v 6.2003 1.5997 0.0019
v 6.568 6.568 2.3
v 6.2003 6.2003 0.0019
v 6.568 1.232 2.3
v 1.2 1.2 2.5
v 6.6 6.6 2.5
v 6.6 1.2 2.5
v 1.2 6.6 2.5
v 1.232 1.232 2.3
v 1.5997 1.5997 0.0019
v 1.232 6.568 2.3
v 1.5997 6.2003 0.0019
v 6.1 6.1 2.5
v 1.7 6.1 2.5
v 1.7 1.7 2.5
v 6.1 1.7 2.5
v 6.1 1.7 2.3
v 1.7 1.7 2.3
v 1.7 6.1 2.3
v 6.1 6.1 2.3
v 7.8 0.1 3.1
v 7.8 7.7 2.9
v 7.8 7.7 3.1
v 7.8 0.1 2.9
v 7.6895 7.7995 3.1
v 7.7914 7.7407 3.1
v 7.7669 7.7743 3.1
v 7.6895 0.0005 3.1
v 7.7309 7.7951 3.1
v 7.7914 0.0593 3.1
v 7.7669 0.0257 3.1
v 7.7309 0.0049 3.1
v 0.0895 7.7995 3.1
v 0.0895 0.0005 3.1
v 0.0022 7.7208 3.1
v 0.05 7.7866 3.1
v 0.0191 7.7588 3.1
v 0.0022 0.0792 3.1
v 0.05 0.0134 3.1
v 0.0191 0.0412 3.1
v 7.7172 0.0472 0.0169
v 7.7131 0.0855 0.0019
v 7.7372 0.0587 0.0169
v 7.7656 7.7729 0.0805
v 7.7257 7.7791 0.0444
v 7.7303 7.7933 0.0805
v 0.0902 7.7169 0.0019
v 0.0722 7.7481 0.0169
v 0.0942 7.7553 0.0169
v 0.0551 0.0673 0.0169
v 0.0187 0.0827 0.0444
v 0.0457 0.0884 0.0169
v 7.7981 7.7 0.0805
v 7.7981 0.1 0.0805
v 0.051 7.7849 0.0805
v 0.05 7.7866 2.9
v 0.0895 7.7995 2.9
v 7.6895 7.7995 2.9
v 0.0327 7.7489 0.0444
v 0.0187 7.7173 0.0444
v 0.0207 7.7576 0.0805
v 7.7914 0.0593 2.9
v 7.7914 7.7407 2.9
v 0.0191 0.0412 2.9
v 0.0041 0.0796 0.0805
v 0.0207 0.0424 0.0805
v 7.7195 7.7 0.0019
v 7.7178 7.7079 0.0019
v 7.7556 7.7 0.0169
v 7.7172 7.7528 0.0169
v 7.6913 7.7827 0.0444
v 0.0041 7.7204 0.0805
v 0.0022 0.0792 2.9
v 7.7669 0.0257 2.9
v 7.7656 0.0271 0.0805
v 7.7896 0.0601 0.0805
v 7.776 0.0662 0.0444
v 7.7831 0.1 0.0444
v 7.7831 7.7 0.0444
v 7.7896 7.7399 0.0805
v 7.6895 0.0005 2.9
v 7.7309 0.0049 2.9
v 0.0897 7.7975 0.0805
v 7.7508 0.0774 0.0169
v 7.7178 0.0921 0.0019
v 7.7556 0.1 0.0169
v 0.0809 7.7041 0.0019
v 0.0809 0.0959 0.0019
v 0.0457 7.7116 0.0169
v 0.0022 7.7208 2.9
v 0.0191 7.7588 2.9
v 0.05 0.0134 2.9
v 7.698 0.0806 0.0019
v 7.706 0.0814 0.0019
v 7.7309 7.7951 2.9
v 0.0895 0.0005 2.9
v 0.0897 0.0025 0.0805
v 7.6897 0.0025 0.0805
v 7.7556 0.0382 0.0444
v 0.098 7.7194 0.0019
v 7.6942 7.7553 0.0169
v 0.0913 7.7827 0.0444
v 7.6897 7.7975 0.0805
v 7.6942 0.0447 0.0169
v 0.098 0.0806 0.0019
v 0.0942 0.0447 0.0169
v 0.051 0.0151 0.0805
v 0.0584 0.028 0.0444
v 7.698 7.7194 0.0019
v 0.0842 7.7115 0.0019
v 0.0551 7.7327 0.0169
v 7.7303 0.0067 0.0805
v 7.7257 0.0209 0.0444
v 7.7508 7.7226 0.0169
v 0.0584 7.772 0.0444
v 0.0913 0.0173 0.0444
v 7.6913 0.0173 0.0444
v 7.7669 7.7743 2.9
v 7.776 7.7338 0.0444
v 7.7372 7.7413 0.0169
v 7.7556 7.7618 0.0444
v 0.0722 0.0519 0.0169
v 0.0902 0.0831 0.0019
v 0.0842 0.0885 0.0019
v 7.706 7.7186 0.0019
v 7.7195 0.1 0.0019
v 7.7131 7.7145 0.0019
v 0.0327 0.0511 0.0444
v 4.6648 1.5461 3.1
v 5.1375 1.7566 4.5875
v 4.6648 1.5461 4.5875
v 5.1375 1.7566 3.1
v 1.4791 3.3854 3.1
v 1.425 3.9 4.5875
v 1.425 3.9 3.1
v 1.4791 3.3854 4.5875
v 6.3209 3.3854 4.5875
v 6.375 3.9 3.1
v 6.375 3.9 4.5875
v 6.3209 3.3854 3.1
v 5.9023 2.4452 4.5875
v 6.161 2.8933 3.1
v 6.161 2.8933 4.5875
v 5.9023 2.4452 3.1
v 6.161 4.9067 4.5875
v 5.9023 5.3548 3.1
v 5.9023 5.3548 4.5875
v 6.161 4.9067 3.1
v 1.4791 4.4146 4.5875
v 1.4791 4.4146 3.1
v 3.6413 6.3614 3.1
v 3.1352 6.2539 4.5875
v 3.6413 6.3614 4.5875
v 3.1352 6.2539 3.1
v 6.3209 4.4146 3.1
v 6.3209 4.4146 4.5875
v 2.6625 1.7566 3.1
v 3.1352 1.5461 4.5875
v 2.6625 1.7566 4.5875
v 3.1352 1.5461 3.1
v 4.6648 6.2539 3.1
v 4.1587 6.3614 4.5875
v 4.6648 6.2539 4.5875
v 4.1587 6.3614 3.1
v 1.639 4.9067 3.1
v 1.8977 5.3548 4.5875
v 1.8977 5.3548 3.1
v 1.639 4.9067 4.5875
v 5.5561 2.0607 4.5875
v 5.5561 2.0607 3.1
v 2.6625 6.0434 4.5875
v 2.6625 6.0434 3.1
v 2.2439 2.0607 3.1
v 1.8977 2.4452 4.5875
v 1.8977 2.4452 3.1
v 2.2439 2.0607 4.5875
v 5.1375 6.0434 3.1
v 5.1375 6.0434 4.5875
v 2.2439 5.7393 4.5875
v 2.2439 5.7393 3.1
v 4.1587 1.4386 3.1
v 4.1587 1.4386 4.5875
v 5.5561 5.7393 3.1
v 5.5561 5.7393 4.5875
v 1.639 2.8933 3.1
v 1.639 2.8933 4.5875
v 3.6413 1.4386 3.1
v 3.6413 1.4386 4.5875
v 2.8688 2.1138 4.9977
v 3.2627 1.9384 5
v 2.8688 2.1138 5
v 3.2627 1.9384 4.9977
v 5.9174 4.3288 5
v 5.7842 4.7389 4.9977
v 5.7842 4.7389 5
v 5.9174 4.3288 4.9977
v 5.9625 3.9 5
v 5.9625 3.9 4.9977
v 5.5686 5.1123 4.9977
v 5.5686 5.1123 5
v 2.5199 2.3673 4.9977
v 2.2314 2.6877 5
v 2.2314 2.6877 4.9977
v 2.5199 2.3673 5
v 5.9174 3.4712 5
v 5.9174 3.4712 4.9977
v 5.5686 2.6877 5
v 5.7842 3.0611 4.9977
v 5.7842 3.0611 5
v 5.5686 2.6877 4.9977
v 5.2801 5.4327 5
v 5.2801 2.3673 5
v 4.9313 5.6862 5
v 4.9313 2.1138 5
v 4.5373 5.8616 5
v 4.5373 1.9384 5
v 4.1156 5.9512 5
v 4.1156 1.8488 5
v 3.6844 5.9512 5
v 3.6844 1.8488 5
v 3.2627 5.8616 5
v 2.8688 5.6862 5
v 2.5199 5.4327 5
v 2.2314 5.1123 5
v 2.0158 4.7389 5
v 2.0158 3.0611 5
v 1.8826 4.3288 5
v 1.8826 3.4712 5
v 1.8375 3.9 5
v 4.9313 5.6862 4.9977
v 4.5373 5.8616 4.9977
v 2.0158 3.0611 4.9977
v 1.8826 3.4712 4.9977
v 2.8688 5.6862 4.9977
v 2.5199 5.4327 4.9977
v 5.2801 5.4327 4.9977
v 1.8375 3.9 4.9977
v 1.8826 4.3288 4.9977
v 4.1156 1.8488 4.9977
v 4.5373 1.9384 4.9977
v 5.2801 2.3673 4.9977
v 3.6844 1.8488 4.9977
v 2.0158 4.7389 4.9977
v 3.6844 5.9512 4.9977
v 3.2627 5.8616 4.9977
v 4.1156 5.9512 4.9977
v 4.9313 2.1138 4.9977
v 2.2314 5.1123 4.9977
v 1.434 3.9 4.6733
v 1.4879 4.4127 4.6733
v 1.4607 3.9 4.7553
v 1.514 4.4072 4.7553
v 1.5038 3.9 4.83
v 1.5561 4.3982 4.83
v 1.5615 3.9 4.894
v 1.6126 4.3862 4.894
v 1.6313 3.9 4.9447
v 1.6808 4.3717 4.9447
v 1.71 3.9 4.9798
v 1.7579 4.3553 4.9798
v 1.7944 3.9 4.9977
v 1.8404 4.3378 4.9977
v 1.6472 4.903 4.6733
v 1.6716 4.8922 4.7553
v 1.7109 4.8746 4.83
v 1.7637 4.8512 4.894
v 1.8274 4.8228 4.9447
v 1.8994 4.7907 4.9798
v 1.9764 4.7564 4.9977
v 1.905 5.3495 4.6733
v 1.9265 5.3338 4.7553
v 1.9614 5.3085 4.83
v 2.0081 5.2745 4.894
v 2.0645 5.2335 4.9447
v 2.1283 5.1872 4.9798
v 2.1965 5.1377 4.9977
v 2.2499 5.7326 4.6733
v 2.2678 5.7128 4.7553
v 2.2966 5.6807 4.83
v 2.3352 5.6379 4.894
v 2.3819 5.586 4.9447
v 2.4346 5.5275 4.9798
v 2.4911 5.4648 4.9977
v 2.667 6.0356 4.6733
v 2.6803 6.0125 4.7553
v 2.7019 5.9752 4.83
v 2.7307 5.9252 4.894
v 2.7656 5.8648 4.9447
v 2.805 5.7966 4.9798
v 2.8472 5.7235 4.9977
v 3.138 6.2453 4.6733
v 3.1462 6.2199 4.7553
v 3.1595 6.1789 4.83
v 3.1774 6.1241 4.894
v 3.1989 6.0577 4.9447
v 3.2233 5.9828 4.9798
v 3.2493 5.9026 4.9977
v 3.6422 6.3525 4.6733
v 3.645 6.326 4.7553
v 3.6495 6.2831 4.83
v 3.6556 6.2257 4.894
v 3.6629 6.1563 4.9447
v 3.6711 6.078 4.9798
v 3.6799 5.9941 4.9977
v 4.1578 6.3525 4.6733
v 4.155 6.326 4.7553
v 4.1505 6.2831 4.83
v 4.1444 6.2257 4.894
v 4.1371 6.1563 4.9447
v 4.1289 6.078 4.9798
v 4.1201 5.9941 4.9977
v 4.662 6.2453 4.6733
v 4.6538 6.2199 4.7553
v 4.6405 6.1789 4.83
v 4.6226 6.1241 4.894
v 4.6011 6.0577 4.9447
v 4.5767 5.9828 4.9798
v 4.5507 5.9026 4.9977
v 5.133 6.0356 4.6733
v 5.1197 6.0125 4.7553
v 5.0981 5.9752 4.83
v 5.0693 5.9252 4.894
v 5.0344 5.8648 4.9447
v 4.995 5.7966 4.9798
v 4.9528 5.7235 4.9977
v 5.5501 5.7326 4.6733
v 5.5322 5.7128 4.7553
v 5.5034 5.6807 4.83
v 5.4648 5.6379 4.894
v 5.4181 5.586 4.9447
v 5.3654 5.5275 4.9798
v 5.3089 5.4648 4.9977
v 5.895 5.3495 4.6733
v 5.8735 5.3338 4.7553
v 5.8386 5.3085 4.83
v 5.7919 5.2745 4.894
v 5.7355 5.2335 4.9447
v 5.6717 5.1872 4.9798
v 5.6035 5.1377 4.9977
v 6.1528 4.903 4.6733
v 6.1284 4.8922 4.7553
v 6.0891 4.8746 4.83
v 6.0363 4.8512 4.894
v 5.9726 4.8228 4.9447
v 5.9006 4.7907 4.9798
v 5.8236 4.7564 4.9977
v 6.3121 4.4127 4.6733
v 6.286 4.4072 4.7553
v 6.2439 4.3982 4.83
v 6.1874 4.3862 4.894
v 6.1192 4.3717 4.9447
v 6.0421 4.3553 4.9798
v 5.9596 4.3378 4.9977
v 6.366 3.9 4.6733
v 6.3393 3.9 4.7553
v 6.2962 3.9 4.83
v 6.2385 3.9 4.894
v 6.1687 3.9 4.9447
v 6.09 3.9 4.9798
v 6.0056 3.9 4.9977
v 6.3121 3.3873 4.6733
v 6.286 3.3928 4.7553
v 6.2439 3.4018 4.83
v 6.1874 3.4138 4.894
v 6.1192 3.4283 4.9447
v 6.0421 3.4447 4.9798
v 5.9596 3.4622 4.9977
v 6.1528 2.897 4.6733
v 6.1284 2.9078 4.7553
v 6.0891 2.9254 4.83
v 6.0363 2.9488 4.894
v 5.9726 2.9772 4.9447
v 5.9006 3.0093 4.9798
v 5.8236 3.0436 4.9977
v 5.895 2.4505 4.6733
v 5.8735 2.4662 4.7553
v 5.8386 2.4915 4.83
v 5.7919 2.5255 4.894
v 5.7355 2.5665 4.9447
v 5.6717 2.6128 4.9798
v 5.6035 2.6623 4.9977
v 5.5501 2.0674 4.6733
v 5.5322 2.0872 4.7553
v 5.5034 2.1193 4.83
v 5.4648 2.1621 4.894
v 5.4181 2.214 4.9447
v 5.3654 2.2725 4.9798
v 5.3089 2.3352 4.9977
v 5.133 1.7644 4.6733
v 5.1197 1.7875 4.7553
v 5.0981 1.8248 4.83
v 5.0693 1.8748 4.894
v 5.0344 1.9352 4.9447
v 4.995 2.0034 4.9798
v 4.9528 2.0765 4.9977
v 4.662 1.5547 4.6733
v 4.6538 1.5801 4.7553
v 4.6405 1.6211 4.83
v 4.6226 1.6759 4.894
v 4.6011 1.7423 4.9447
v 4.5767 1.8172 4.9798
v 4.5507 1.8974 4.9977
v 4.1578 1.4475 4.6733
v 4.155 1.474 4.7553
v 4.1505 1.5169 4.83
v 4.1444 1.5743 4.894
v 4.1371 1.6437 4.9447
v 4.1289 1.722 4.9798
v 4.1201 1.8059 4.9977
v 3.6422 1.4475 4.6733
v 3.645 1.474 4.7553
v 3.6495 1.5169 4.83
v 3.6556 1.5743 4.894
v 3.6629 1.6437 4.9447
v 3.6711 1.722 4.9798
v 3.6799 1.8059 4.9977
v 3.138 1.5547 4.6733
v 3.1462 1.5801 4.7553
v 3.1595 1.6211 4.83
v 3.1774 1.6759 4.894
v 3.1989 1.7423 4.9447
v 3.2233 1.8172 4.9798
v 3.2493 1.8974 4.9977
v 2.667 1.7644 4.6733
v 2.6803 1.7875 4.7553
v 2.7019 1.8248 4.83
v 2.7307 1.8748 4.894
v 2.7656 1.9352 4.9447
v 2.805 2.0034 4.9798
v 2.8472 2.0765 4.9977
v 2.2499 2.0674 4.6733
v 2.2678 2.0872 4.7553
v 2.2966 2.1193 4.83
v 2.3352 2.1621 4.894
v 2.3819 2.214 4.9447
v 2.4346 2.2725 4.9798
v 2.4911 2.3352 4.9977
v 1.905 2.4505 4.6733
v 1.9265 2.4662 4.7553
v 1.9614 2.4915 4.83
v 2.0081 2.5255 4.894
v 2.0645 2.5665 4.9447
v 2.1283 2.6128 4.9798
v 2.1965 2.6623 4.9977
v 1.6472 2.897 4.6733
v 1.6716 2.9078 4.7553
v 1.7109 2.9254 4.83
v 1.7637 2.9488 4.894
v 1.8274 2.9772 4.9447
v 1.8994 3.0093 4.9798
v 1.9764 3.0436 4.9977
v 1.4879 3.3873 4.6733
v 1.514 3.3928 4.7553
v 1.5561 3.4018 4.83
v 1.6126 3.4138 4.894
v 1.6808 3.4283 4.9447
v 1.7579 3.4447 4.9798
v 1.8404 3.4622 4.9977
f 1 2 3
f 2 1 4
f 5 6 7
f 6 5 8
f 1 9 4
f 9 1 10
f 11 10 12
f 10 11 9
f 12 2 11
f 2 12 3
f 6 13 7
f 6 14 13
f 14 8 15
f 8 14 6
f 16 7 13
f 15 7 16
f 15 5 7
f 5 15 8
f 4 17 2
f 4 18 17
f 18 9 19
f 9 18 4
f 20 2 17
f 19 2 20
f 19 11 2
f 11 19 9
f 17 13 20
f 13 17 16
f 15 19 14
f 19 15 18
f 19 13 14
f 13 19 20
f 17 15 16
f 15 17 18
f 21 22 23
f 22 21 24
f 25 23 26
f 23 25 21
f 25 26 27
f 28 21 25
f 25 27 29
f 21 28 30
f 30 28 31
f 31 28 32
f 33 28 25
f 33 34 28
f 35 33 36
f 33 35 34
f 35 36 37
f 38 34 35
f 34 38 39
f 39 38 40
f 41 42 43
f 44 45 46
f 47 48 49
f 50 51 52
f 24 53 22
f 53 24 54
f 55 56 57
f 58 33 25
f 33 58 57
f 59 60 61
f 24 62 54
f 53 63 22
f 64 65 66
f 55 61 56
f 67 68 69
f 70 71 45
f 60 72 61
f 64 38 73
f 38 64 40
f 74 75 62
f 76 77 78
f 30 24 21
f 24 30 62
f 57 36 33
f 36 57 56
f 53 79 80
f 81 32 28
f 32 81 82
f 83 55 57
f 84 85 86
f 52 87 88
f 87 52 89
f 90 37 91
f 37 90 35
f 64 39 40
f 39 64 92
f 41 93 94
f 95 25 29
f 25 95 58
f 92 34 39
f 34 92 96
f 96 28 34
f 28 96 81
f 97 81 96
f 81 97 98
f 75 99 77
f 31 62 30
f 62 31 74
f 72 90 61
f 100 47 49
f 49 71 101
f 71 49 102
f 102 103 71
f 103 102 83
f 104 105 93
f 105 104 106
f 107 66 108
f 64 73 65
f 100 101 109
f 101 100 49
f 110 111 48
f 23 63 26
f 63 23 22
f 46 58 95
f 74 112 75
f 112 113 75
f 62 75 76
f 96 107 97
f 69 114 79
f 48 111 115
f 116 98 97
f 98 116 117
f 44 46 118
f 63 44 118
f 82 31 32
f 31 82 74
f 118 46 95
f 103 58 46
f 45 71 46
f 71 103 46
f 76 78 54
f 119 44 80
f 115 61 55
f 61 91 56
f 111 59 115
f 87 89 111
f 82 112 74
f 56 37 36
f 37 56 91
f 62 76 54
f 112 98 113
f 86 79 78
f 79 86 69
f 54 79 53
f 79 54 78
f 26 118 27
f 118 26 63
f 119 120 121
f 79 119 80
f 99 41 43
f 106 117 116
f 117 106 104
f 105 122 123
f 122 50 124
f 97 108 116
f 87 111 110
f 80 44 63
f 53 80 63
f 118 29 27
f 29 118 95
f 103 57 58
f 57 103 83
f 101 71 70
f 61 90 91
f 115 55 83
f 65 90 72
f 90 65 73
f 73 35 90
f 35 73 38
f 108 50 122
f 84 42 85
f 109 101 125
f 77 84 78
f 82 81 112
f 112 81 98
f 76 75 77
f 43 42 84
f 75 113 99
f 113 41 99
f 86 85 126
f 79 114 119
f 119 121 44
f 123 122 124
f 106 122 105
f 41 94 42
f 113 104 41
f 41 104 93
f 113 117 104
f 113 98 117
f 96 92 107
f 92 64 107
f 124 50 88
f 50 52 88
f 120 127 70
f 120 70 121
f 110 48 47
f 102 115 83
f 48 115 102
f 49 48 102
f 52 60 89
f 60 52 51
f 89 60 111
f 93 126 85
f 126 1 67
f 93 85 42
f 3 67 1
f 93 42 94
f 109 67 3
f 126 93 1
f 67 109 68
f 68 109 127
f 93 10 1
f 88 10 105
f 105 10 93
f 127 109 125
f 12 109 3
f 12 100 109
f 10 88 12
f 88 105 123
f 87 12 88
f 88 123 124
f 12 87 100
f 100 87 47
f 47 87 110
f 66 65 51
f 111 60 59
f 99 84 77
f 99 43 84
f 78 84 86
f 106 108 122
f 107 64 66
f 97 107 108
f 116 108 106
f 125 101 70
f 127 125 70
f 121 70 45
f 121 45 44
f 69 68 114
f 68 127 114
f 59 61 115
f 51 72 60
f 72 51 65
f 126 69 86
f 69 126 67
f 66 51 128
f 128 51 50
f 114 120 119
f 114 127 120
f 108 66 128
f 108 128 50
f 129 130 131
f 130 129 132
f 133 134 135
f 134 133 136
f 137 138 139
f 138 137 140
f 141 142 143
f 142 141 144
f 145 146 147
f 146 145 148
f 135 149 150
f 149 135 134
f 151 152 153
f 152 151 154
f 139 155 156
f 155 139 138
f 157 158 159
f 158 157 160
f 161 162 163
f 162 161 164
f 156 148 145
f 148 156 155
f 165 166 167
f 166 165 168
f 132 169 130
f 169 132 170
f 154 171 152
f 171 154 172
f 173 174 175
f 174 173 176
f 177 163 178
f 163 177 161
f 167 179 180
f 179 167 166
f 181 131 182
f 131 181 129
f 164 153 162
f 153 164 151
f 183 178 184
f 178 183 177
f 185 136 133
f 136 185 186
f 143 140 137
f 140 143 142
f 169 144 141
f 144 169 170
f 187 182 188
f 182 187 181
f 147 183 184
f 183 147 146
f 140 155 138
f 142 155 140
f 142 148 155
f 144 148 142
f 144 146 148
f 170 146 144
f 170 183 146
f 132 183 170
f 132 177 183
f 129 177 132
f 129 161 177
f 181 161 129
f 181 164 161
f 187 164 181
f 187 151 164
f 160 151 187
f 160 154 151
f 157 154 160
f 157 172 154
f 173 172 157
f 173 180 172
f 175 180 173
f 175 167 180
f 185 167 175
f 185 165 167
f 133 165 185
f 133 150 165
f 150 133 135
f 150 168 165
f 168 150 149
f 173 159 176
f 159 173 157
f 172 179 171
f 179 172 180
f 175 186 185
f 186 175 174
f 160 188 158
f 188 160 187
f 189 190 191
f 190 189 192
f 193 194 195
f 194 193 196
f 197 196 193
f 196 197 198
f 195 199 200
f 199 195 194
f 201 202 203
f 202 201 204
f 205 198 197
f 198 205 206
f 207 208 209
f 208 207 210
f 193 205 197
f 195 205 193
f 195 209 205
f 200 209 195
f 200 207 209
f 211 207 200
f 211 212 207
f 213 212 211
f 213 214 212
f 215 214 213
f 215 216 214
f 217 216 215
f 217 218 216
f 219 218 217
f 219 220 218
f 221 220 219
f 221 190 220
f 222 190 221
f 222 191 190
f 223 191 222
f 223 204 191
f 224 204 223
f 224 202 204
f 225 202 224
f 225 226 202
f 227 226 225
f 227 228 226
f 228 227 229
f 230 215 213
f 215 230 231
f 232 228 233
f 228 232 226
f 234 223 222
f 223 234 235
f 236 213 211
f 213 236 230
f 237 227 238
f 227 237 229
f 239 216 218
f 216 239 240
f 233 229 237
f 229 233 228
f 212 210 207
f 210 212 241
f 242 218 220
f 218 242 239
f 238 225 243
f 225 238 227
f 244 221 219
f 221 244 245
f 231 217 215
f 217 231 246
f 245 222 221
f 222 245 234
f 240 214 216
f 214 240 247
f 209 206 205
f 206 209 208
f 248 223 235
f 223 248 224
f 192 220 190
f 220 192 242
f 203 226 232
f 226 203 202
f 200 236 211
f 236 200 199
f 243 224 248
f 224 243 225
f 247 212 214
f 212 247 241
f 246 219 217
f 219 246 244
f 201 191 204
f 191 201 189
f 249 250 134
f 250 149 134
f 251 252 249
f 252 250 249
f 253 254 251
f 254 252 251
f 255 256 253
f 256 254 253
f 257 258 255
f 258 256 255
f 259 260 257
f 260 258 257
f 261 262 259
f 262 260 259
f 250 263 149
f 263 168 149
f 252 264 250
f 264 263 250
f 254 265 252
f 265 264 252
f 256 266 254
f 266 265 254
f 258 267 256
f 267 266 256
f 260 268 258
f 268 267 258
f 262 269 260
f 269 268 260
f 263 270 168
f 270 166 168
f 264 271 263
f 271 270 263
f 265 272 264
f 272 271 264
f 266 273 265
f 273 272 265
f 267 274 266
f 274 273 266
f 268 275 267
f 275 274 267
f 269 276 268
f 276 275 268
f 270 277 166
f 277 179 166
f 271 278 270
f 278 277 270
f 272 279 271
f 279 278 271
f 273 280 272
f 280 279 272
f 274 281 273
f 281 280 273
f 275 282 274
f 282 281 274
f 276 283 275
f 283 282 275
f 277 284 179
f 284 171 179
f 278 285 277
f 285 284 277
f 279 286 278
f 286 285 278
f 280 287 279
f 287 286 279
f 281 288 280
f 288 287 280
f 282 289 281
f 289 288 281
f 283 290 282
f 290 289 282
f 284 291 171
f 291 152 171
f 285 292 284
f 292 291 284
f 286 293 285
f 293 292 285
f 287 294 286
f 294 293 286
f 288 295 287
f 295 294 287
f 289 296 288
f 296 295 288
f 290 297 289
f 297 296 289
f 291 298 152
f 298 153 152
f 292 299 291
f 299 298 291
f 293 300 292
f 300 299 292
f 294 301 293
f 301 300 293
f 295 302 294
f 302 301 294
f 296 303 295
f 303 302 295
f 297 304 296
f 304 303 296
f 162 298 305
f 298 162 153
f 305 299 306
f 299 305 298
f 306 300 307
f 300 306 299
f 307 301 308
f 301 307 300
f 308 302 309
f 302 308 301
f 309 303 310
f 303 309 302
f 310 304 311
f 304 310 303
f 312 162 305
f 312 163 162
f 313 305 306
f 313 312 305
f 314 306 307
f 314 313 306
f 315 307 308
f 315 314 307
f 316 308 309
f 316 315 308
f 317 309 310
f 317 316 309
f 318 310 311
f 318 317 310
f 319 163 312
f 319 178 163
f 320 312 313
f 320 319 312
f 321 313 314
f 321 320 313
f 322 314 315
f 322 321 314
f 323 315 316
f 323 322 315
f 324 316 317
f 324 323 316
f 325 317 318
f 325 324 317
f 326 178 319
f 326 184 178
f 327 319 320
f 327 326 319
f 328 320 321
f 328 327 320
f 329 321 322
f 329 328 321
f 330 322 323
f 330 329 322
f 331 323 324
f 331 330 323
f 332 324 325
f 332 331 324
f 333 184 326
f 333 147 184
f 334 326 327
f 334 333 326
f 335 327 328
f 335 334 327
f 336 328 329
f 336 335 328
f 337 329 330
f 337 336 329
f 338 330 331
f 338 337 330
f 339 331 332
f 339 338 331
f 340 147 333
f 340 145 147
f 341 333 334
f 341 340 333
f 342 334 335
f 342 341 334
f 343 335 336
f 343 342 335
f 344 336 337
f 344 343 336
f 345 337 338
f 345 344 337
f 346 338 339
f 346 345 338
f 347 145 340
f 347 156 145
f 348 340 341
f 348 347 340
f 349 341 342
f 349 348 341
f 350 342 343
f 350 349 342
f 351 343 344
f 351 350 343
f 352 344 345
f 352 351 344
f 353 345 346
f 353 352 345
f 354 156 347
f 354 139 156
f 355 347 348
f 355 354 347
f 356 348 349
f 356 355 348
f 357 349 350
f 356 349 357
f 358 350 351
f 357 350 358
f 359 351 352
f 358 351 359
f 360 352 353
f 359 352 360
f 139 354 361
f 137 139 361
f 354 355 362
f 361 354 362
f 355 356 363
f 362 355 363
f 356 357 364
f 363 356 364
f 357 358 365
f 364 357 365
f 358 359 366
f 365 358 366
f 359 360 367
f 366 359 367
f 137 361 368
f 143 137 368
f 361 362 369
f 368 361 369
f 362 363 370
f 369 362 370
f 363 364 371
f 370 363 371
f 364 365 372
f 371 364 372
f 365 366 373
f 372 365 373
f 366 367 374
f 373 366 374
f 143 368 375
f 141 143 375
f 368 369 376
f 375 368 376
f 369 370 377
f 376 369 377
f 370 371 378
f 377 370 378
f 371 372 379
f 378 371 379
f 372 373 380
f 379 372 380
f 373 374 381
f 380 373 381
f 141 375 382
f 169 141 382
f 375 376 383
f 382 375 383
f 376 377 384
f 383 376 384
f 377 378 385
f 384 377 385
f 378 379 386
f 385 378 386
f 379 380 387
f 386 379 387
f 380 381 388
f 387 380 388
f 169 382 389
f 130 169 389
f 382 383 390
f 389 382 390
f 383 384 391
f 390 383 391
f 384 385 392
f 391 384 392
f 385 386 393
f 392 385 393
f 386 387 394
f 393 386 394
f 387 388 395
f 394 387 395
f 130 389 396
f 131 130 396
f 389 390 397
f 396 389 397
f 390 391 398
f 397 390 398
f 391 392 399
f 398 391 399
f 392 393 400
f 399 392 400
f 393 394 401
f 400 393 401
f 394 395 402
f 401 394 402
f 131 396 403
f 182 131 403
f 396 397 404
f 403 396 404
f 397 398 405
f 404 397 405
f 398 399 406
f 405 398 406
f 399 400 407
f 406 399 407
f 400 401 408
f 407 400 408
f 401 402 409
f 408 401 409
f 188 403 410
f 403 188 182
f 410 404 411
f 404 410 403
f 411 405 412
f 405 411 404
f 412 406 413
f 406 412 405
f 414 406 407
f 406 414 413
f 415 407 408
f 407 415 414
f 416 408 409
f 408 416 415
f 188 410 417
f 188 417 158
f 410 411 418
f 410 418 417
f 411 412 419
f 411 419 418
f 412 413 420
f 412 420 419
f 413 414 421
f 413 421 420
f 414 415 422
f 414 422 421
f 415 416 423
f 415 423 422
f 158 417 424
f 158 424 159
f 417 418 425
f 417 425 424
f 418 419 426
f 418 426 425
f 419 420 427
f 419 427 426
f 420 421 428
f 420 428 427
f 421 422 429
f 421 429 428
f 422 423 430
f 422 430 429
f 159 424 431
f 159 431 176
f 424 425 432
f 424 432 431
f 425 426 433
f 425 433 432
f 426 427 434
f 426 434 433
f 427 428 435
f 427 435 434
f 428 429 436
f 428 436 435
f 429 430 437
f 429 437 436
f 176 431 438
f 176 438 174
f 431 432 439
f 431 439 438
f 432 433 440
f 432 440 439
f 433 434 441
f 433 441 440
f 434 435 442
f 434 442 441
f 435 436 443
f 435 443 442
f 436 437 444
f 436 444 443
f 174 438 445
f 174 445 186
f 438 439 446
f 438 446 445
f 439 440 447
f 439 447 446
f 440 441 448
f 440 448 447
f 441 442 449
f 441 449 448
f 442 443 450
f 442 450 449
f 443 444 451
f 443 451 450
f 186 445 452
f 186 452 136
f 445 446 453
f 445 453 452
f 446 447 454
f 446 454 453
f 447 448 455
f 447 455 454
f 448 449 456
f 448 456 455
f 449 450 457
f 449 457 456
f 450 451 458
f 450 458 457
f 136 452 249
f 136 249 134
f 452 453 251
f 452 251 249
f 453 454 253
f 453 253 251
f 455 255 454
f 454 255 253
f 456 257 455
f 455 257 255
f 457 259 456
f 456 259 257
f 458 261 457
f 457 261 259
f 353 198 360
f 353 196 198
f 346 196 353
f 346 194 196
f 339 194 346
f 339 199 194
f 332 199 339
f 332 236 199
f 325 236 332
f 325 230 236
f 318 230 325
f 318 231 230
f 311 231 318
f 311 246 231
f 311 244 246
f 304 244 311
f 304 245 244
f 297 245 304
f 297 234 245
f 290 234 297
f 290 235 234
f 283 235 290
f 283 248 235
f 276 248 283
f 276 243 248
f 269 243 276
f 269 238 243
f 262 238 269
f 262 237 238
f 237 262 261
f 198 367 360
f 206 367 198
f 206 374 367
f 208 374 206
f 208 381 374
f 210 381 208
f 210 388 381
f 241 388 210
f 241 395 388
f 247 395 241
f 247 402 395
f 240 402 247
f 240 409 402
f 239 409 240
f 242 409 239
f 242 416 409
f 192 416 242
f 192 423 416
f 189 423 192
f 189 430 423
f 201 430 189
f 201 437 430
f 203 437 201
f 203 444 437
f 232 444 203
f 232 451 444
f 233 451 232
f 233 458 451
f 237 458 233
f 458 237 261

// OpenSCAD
// file: ../lib/brick-hollow.scad
/**
* Machine Blocks
* https://machinemania.net/blocks 
*
* Brick Hollow
* Copyright (c) 2022 Jan Philipp Knoeller <pk@pksoftware.de>
*
* Published under license:
* Creative Commons Attribution-NonCommercial-ShareAlike 4.0 International 
* https://creativecommons.org/licenses/by-nc-sa/4.0/
*
*/
echo(version=version());

module brickHollow(height=9.3, fade=2.5, minSize=[4.6,4.6], maxSize=[5.2, 5.2], center = false){
    echo(height, minSize, maxSize, fade);
    sizeX = max(minSize[0],maxSize[0]); 
   sizeY = max(minSize[1],maxSize[1]); 
    
    posX = center ? 0 : 0.5*sizeX; 
   posY = center ? 0 : 0.5*sizeY;   
   posZ = center ? -0.5 * (height-fade) : 0.5*fade;
    
    cutHelper = 0.2;
    overlapSpace=0.1;
    
    translate([posX, posY, posZ]){
        union(){
            polyhedron(points=[
                [-0.5*minSize[0],-0.5*minSize[1],-0.5*fade],
                [0.5*minSize[0],-0.5*minSize[1],-0.5*fade],
                [0.5*minSize[0],0.5*minSize[1],-0.5*fade],
                [-0.5*minSize[0],0.5*minSize[1],-0.5*fade],
                [-0.5*maxSize[0],-0.5*maxSize[1],0.5*fade],
                [0.5*maxSize[0],-0.5*maxSize[1],0.5*fade],
                [0.5*maxSize[0],0.5*maxSize[1],0.5*fade],
                [-0.5*maxSize[0],0.5*maxSize[1],0.5*fade]
            ], faces=[[0,1,2,3],[1,0,4,5],[2,1,5,6],[3,2,6,7],[0,3,7,4],[7,6,5,4]]);
            
            if(height > fade){
                translate([0,0,0.5*height - overlapSpace]){
                    cube([maxSize[0], maxSize[1], height - fade + overlapSpace], center=true);
                }
            }
            
            translate([0,0,-0.5*(fade + cutHelper) + overlapSpace]){
                cube([minSize[0], minSize[1], cutHelper + overlapSpace], center=true);
            }
        }
    }
}

//brickHollow(height=9.3, maxSize=[5.2,5.2], minSize=[4.6,4.6], center=true);
// file: ../lib/roundedcube_simple.scad
/**
* Machine Blocks
* https://machinemania.net/blocks 
*
* Module for simple rounded cubes
* Copyright (c) 2022 Jan Philipp Knoeller <pk@pksoftware.de>
*
* Published under license:
* Creative Commons Attribution-NonCommercial-ShareAlike 4.0 International 
* https://creativecommons.org/licenses/by-nc-sa/4.0/
*
*/
module roundedcube_simple(size = [1, 1, 1], center = false, radius = 0.5, resolution = 20) {
	// If single value, convert to [x, y, z] vector
	size = (size[0] == undef) ? [size, size, size] : size;

	translate = (center == false) ?
		[radius, radius, radius] :
		[
			radius - (size[0] / 2),
			radius - (size[1] / 2),
			radius - (size[2] / 2)
	];

	translate(v = translate)
	minkowski() {
		cube(size = [
			size[0] - (radius * 2),
			size[1] - (radius * 2),
			size[2] - (radius * 2)
		]);
		sphere(r = radius, $fn = resolution);
	}
}
// file: ../lib/roundedcube.scad
// More information: https://danielupshaw.com/openscad-rounded-corners/

// Set to 0.01 for higher definition curves (renders slower)
$fs = 0.15;

module roundedcube(size = [1, 1, 1], center = false, radius = 0.5, apply_to = "all", resolution = 20) {
	// If single value, convert to [x, y, z] vector
	size = (size[0] == undef) ? [size, size, size] : size;

	translate_min = radius;
	translate_xmax = size[0] - radius;
	translate_ymax = size[1] - radius;
	translate_zmax = size[2] - radius;

	diameter = radius * 2;

	obj_translate = (center == false) ?
		[0, 0, 0] : [
			-(size[0] / 2),
			-(size[1] / 2),
			-(size[2] / 2)
		];

	translate(v = obj_translate) {
		hull() {
			for (translate_x = [translate_min, translate_xmax]) {
				x_at = (translate_x == translate_min) ? "min" : "max";
				for (translate_y = [translate_min, translate_ymax]) {
					y_at = (translate_y == translate_min) ? "min" : "max";
					for (translate_z = [translate_min, translate_zmax]) {
						z_at = (translate_z == translate_min) ? "min" : "max";

						translate(v = [translate_x, translate_y, translate_z])
						if (
							(apply_to == "all") ||
							(apply_to == "xmin" && x_at == "min") || (apply_to == "xmax" && x_at == "max") ||
							(apply_to == "ymin" && y_at == "min") || (apply_to == "ymax" && y_at == "max") ||
							(apply_to == "zmin" && z_at == "min") || (apply_to == "zmax" && z_at == "max")
						) {
							sphere(r = radius, $fn = resolution);
						} else {
							rotate = 
								(apply_to == "xmin" || apply_to == "xmax" || apply_to == "x") ? [0, 90, 0] : (
								(apply_to == "ymin" || apply_to == "ymax" || apply_to == "y") ? [90, 90, 0] :
								[0, 0, 0]
							);
							rotate(a = rotate)
							cylinder(h = diameter, r = radius, center = true, $fn = resolution);
						}
					}
				}
			}
		}
	}
}
// main file
/**
* Machine Blocks
* https://machinemania.net/blocks 
*
* Plate 1x1
* Copyright (c) 2022 Jan Philipp Knoeller <pk@pksoftware.de>
*
* Published under license:
* Creative Commons Attribution-NonCommercial-ShareAlike 4.0 International 
* https://creativecommons.org/licenses/by-nc-sa/4.0/
*
*/
echo(version=version());

include <../lib/block-v2.scad>;

block(grid=[1,1], withKnobs=false);
echo(version=version());

include <../lib/block-v2.scad>;

block(grid=[1,1]);
